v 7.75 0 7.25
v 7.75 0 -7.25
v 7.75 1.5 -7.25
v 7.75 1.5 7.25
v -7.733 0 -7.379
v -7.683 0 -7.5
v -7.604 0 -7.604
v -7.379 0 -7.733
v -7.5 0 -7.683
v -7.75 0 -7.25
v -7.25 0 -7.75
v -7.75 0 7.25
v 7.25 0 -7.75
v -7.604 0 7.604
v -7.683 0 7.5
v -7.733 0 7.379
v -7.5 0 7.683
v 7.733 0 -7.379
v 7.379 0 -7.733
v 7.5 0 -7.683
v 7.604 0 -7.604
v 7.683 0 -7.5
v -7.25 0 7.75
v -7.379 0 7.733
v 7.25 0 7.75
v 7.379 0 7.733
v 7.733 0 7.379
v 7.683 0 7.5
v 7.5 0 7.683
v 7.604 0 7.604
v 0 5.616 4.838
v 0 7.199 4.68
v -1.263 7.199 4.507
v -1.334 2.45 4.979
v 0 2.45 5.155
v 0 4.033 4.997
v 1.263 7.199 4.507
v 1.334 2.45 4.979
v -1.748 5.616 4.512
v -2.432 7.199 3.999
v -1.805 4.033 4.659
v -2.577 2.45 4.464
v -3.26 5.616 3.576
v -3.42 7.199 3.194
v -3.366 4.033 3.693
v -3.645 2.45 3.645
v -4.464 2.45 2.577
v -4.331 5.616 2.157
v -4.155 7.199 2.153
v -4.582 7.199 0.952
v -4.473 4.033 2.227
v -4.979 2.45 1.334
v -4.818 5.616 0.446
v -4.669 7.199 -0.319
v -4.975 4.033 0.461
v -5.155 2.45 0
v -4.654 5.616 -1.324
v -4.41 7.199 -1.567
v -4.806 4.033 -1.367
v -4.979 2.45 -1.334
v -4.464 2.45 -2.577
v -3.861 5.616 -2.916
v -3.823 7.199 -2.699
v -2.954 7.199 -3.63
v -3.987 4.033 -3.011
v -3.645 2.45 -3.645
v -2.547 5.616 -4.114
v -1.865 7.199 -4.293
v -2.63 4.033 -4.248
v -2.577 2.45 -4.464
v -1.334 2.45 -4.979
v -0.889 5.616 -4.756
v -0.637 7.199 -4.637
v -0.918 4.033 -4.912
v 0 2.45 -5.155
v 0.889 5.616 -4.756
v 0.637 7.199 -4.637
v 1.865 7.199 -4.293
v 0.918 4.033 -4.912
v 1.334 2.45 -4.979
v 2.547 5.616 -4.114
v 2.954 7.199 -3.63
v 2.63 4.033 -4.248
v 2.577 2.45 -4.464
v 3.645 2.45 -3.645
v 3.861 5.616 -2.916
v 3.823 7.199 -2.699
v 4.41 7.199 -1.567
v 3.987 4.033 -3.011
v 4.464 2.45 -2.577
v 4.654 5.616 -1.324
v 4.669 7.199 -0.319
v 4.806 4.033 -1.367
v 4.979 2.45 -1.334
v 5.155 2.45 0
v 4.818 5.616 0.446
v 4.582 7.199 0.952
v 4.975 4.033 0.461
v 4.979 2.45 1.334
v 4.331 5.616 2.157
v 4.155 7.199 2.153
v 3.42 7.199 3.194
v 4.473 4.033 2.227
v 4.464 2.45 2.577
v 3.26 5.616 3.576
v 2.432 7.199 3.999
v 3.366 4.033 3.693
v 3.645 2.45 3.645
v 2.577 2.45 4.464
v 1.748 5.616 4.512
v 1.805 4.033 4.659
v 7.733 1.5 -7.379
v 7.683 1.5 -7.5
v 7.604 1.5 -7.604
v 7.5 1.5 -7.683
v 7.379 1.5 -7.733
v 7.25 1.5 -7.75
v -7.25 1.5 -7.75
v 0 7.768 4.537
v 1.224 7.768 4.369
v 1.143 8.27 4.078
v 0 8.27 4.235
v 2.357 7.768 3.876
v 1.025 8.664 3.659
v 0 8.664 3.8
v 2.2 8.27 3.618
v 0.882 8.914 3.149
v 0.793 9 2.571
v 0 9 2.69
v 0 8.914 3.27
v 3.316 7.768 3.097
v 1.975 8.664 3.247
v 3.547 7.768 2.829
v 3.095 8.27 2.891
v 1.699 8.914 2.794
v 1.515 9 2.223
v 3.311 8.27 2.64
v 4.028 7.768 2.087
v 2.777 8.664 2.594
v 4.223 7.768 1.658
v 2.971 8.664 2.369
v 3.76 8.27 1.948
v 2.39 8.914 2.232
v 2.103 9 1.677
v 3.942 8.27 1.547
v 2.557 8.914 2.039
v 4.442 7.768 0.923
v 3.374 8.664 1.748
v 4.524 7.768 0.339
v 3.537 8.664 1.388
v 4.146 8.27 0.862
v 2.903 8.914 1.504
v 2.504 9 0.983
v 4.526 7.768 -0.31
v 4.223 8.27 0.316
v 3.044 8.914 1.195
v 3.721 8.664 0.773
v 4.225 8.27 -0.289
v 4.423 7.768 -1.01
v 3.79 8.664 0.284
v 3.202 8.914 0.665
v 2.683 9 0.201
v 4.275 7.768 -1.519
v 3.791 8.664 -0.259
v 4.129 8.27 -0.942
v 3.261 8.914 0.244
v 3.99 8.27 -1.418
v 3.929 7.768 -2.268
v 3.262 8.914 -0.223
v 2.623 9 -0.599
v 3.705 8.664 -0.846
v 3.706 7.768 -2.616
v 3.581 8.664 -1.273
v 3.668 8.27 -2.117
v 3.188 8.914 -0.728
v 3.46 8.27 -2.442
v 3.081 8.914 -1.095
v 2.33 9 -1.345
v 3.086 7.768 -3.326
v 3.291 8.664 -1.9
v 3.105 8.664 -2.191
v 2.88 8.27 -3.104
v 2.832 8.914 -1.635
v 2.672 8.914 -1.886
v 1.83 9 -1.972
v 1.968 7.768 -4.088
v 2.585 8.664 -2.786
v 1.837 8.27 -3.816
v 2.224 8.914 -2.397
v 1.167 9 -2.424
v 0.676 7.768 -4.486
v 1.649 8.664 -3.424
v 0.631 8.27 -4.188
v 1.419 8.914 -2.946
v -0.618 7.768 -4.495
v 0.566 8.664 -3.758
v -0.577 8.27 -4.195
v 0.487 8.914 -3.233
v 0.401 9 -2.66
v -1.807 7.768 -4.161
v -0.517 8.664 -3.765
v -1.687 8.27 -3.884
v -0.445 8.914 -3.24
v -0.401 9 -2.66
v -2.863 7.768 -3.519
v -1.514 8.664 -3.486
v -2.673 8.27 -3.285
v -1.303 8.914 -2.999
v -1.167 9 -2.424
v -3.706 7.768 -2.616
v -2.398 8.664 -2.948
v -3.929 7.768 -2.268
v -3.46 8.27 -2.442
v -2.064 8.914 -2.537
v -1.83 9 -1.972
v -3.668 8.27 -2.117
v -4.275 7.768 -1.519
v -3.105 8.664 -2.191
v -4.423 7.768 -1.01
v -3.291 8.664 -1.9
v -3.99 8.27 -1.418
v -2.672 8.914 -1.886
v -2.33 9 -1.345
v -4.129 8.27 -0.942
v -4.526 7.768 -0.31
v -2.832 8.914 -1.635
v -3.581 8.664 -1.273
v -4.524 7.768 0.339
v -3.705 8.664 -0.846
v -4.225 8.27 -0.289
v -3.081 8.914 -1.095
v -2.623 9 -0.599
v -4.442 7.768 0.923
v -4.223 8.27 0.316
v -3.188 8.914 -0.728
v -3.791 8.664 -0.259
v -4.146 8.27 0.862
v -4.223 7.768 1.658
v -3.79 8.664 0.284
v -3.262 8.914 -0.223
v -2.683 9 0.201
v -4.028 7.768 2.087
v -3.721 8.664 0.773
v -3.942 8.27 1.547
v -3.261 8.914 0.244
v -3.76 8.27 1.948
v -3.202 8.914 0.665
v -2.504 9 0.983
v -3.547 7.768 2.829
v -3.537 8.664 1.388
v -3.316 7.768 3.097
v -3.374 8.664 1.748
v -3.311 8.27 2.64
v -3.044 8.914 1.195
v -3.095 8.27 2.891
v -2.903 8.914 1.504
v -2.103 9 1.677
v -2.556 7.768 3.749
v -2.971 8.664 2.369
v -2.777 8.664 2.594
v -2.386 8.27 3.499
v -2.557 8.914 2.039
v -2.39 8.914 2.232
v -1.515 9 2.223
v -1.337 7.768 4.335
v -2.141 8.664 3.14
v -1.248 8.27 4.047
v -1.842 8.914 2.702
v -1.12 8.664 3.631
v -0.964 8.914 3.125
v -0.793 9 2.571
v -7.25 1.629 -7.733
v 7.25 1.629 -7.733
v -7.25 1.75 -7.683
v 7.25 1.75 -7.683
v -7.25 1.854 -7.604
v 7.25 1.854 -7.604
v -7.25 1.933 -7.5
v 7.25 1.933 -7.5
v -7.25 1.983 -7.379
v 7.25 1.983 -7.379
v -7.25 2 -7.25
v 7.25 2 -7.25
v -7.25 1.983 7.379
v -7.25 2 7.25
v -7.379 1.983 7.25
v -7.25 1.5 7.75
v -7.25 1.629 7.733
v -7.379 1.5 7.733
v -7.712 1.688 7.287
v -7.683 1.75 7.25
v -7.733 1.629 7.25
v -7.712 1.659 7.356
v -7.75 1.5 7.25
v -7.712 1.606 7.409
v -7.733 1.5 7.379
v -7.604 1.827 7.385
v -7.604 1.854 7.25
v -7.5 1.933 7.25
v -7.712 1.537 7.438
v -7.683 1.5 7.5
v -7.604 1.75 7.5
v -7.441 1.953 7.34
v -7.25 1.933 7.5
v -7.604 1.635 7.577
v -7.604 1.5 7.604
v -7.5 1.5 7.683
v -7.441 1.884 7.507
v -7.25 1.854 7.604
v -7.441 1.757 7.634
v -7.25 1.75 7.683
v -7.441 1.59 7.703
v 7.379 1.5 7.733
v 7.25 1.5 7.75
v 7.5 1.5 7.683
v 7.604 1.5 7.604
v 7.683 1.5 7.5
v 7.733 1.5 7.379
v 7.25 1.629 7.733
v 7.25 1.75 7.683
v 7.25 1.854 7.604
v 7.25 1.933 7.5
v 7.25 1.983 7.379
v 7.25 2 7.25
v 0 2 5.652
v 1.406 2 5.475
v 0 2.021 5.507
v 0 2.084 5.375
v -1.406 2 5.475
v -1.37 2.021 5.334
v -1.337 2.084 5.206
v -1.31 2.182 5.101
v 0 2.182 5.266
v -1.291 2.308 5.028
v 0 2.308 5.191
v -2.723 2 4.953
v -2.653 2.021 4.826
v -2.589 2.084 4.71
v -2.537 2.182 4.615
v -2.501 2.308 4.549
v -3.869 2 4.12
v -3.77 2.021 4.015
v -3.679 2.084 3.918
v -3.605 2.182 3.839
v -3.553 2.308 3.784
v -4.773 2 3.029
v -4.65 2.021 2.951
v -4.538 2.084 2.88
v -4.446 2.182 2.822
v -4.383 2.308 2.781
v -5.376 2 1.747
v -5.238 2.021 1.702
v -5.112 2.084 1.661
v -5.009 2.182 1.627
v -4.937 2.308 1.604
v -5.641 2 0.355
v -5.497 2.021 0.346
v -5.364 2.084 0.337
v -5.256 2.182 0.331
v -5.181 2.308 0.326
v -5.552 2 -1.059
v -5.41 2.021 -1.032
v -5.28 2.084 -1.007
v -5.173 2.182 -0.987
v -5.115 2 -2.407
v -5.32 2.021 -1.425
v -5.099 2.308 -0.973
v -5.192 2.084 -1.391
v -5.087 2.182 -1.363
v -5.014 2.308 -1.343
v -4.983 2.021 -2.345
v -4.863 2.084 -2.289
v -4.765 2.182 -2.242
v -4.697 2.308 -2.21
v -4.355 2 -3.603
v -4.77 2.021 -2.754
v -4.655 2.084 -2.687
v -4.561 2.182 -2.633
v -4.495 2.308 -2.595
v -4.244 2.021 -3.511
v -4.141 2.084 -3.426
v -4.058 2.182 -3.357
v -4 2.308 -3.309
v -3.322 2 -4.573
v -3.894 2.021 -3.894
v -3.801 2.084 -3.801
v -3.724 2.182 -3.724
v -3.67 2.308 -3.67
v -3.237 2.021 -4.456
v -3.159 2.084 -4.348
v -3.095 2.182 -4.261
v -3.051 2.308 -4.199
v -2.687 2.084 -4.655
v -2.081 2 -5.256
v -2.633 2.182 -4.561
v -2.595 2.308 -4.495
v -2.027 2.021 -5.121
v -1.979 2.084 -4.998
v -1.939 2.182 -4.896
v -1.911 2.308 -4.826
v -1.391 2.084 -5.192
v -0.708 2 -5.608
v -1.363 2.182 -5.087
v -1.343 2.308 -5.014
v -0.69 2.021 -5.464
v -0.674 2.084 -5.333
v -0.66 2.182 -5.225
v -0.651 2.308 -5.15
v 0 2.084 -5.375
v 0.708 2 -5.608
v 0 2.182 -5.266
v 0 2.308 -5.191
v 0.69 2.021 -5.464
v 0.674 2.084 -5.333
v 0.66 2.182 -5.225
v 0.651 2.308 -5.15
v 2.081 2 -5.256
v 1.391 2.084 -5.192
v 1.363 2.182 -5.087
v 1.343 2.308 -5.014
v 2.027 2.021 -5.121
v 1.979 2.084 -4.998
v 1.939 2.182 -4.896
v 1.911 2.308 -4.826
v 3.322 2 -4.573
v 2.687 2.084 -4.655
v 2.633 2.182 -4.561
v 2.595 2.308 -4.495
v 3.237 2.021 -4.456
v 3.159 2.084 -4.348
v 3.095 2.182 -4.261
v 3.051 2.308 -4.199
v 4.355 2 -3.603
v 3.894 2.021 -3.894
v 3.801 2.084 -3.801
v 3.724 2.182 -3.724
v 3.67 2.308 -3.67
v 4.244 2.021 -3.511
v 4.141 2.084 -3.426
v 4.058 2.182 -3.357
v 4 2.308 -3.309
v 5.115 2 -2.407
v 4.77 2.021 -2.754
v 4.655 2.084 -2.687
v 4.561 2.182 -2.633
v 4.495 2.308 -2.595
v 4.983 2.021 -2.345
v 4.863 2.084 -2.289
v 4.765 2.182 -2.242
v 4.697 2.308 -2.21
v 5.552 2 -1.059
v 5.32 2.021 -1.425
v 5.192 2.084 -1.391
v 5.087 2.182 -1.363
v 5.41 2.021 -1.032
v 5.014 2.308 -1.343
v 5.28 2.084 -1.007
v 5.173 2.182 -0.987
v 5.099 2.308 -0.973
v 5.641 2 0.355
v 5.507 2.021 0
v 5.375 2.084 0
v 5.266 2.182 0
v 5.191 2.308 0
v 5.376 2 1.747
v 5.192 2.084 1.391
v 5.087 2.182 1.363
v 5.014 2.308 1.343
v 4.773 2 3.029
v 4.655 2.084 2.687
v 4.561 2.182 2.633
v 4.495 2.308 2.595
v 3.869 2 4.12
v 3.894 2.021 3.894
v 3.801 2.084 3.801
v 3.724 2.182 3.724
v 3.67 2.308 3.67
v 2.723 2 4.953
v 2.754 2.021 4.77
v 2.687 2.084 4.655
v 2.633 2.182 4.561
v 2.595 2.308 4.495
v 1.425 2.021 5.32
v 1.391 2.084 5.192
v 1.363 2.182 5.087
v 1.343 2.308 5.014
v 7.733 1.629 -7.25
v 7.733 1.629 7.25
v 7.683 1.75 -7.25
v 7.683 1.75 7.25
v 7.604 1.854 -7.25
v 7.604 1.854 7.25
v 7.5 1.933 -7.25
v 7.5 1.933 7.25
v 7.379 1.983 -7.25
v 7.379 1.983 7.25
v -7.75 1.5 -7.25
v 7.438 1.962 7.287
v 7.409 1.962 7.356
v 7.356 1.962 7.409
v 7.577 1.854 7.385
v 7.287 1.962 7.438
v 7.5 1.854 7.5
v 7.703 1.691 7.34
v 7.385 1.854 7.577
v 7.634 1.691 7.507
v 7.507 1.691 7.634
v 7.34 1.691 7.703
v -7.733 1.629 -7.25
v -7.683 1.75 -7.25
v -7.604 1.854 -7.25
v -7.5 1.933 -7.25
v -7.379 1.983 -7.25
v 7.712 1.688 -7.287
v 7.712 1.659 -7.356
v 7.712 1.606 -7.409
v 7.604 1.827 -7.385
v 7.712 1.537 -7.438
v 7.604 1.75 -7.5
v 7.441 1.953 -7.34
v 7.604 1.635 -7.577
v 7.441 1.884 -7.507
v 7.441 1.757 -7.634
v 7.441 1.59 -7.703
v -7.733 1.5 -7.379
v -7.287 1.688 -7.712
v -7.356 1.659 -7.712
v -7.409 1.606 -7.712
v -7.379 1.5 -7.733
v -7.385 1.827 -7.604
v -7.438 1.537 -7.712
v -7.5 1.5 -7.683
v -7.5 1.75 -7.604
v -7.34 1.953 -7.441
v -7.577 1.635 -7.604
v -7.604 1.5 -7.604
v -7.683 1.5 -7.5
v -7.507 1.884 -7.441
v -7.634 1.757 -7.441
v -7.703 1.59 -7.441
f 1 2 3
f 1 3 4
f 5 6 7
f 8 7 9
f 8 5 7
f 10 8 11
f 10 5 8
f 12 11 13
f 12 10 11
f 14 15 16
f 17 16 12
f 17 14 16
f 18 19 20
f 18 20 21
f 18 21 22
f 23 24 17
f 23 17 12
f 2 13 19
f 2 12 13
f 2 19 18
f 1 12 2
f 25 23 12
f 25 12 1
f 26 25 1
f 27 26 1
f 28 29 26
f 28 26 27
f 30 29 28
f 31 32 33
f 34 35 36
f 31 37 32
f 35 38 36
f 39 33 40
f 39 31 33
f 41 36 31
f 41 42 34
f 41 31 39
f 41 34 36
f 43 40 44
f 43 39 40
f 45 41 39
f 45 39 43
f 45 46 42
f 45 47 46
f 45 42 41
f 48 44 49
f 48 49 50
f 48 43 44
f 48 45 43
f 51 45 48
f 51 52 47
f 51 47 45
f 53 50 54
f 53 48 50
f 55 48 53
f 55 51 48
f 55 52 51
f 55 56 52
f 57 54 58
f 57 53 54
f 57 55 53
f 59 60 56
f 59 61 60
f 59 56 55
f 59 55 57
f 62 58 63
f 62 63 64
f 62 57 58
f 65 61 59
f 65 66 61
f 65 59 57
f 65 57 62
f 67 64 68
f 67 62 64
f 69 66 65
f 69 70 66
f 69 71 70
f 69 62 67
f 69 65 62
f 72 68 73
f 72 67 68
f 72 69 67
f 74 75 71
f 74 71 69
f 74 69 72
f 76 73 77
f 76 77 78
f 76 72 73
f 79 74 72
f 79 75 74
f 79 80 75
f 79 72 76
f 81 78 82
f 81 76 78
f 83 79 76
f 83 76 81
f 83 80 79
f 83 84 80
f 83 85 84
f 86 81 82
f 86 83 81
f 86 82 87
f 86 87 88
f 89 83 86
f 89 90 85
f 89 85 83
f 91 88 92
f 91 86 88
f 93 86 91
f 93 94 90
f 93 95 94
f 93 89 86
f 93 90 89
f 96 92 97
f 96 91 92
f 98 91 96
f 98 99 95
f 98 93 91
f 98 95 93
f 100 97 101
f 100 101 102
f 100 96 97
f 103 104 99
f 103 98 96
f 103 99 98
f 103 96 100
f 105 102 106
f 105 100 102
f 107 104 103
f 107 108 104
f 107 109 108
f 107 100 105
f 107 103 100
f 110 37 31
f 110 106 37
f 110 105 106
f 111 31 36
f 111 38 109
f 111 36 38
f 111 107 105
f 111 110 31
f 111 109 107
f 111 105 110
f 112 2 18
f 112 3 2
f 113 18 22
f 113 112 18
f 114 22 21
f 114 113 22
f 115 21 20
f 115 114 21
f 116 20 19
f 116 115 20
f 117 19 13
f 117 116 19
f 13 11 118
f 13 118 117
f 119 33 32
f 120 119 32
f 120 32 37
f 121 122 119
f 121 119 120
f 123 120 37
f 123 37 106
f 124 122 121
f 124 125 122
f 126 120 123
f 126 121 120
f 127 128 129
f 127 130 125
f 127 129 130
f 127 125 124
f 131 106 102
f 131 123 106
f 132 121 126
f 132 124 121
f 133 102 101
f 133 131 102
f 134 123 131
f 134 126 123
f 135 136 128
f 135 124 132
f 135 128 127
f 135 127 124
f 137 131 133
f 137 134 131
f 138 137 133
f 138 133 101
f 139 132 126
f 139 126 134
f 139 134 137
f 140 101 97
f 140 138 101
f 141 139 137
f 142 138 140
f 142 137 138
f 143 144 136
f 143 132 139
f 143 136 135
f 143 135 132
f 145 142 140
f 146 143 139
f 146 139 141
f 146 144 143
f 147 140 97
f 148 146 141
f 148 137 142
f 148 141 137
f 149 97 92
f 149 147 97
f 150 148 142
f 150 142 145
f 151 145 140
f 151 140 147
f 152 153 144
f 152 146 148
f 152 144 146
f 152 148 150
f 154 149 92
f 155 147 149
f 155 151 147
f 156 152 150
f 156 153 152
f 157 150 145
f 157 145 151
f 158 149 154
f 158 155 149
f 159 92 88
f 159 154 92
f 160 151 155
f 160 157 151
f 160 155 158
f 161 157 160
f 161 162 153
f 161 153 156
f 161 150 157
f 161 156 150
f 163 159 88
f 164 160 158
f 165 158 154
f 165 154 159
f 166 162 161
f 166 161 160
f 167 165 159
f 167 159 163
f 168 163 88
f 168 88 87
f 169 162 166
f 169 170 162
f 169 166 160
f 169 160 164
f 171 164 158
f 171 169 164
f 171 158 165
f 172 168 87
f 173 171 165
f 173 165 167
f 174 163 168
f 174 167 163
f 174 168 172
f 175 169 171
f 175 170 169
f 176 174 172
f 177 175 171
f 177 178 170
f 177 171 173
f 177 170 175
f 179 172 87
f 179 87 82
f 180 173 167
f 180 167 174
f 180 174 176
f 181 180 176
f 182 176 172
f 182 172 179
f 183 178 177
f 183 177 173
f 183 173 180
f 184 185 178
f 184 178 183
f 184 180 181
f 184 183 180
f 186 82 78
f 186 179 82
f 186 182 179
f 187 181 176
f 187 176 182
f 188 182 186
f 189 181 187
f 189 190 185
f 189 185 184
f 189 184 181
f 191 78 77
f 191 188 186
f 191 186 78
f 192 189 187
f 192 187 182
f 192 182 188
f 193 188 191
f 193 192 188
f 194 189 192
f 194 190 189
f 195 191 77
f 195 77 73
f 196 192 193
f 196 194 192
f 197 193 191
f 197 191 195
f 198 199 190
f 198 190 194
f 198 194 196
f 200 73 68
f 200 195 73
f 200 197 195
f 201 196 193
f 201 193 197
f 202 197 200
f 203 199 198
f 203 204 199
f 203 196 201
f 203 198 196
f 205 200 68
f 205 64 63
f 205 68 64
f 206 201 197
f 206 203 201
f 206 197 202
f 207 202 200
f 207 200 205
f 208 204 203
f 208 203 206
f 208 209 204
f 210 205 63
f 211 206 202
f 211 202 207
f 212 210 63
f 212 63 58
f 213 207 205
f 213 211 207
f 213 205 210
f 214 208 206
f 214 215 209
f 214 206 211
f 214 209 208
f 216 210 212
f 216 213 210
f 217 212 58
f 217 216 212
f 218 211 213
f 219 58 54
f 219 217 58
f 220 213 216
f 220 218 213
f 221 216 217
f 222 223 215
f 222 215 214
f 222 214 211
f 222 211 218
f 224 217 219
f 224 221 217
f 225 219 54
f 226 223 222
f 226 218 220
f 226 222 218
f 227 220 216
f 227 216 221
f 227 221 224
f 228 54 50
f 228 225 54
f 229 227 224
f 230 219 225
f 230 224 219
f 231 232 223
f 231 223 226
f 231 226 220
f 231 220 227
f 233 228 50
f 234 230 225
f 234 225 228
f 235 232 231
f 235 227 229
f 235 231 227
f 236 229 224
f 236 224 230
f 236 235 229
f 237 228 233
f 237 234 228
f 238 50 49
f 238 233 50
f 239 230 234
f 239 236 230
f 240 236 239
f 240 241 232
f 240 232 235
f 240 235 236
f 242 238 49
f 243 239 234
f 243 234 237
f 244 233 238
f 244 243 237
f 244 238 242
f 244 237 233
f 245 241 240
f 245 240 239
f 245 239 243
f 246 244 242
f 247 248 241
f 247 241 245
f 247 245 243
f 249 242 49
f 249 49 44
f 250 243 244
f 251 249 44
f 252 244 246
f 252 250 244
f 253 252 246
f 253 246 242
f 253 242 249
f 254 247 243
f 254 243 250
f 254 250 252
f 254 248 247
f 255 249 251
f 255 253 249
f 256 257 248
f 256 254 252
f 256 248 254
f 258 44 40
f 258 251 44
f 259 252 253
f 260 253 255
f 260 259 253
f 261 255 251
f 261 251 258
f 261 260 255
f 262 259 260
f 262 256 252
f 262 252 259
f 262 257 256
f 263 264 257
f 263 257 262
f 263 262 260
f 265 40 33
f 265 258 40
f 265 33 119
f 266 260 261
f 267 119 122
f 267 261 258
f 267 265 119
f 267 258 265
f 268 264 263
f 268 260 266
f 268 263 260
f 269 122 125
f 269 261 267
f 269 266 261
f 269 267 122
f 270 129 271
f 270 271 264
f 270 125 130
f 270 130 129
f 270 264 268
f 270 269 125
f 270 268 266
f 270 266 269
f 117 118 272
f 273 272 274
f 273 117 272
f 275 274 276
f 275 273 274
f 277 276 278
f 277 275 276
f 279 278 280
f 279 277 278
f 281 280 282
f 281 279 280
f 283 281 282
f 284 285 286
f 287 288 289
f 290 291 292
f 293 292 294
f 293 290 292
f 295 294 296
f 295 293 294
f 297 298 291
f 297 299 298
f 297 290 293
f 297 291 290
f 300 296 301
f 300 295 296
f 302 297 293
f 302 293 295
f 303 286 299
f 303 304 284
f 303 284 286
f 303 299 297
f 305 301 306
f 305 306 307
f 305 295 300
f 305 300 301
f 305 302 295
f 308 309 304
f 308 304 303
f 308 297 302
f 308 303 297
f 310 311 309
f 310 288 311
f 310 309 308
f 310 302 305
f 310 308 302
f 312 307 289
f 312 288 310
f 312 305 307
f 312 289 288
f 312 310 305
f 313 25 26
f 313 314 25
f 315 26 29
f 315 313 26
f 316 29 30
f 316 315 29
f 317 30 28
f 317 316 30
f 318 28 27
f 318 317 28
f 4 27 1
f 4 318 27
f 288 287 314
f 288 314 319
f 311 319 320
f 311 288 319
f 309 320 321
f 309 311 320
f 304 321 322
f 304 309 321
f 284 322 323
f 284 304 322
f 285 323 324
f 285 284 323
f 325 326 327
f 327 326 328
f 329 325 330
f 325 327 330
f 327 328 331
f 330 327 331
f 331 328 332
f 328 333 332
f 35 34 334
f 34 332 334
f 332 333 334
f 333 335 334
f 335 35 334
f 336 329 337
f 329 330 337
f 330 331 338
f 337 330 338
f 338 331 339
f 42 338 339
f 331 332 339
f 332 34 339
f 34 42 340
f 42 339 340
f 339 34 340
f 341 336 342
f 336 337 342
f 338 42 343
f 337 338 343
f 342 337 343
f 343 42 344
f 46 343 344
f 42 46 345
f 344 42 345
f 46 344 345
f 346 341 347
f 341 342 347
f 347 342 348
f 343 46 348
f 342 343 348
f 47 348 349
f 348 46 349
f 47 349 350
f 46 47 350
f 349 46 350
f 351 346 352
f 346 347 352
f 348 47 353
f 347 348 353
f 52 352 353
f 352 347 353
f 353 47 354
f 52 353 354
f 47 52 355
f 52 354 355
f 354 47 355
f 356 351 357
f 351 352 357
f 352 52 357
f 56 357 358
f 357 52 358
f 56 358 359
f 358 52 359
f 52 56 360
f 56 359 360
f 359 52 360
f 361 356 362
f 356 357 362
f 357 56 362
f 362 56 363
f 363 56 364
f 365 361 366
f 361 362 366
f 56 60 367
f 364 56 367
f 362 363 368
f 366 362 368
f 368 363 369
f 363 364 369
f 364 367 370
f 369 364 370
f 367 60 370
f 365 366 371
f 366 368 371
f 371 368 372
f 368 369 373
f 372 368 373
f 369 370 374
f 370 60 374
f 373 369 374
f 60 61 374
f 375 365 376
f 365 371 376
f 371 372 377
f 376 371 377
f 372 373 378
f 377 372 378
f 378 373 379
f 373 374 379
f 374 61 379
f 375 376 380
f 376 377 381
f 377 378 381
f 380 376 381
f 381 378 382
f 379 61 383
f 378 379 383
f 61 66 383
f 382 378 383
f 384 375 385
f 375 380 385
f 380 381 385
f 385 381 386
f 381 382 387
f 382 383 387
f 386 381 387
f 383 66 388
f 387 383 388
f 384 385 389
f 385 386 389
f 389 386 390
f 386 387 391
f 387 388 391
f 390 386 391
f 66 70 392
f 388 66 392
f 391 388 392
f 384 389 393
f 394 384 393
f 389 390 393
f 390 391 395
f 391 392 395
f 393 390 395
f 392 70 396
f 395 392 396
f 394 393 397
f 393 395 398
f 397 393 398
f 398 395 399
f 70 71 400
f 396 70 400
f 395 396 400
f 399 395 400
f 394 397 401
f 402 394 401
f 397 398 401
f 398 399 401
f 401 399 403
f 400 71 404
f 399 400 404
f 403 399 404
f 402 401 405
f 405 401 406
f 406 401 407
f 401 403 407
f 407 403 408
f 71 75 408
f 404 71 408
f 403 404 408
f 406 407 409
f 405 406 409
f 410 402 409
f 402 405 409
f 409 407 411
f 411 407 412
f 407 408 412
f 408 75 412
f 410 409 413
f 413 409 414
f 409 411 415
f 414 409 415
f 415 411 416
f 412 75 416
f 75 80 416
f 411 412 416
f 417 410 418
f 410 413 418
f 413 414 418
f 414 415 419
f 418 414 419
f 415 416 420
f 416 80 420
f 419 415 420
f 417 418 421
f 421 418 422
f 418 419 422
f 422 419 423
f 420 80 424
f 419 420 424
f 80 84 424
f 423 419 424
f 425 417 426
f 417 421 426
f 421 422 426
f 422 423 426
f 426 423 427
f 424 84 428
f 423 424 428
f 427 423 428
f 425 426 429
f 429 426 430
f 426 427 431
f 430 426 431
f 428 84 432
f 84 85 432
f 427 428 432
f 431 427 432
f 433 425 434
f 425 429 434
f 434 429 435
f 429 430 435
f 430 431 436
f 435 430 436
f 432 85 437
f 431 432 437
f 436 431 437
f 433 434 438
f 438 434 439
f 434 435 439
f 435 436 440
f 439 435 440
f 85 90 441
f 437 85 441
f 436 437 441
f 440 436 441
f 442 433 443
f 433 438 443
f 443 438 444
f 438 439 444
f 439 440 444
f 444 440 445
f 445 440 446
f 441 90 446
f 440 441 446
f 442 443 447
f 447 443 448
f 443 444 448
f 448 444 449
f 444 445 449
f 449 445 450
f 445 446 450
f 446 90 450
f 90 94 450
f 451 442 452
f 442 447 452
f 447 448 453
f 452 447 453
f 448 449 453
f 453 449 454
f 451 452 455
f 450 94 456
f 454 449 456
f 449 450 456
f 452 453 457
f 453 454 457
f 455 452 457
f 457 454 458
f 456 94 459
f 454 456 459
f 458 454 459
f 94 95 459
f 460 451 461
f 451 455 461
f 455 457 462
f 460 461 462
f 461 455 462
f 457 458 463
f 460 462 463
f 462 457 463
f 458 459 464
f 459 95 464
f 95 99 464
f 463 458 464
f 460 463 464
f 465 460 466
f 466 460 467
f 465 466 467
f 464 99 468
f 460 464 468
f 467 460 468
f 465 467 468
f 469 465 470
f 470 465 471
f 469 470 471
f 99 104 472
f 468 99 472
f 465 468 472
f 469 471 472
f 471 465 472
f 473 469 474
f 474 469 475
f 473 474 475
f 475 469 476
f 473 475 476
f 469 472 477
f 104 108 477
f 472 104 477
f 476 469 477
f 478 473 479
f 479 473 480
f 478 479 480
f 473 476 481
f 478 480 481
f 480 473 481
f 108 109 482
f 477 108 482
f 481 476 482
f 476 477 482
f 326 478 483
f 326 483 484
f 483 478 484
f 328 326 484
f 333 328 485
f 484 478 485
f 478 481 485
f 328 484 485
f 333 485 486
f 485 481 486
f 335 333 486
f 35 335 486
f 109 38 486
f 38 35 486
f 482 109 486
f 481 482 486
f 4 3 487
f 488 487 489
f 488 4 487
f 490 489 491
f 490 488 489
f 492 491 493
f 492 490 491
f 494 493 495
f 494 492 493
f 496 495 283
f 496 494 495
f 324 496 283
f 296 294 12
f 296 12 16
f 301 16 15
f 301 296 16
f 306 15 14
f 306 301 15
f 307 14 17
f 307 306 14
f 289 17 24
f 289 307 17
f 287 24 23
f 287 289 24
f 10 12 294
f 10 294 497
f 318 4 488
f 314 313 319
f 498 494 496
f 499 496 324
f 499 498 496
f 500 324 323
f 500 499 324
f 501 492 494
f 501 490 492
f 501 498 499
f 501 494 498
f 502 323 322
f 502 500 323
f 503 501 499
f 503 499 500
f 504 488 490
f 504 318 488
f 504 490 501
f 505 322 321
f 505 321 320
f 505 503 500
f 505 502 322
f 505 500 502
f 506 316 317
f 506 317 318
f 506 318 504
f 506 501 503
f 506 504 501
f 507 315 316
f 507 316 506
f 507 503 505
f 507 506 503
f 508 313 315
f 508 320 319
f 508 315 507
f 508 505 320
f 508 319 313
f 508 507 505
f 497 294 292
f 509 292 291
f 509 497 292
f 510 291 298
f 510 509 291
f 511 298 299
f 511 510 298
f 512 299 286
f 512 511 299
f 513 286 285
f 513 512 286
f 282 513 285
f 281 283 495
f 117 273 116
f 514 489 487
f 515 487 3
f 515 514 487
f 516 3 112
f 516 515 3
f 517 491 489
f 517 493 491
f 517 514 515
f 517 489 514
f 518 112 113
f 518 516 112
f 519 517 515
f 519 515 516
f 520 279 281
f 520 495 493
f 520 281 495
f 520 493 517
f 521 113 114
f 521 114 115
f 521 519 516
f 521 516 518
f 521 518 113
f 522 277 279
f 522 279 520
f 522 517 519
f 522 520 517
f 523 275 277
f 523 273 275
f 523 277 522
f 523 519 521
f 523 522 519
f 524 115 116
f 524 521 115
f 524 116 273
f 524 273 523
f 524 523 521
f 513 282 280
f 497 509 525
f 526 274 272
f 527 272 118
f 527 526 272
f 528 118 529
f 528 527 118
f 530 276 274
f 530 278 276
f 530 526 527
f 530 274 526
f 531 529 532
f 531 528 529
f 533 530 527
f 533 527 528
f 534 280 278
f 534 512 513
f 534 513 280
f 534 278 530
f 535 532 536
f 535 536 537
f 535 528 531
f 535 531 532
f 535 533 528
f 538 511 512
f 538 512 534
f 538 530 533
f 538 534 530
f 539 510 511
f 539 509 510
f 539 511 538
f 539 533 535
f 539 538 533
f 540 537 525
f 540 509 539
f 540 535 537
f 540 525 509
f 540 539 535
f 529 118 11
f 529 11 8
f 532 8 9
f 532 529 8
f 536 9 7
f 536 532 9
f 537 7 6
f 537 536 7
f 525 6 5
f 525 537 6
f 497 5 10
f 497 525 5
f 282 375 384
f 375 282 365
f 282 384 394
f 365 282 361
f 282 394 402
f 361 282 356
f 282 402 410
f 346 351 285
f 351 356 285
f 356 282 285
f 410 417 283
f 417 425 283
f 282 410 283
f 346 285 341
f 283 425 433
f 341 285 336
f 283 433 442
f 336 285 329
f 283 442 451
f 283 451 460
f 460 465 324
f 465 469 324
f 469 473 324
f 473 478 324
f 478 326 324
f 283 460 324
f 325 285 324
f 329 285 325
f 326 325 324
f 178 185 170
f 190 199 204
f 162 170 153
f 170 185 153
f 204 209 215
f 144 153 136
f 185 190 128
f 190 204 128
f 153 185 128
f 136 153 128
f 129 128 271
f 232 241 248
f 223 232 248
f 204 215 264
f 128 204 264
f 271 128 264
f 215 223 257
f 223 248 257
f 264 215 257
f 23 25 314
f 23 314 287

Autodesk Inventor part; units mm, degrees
ref_plane "YZ Plane" through (0, 0, 0) normal (1, 0, 0) x (0, 1, 0)
ref_plane "XZ Plane" through (0, 0, 0) normal (0, 1, 0) x (-1, 0, 0)
ref_plane "XY Plane" through (0, 0, 0) normal (0, 0, 1) x (1, 0, 0)
sketch "Sketch1" plane through (0, 0, 0) normal (1, 0, 0) x (0, 1, 0)
  line L0 (9, 0) -> (9, 4.5)
  line L1 (9, 4.5) -> (2, 5.2)
  line L2 (2, 5.2) -> (2, 7.2)
  line L3 (2, 7.2) -> (0, 7.2)
  line L4 (0, 7.2) -> (0, 0)
  line L5 (9, 0) -> (0, 0)
  dimension "d0" = 4.5
  dimension "d1" = 9
  dimension "d2" = 2
  dimension "d3" = 2
  dimension "d5" = 7.2
  dimension "d6" = 5.2
revolve "Revolution1" add sketch "Sketch1" angle 360 about axis through (0, 9, 0) along (0, -1, 0)
fillet "Fillet1" radius 2 1 edges at (0, 9, -4.5)
sketch "Sketch2" plane through (0, 0, 0) normal (0, -1, 0) x (1, 0, 0)
  line L0 (-7.75, -7.75) -> (7.75, -7.75)
  line L1 (7.75, -7.75) -> (7.75, 7.75)
  line L2 (7.75, 7.75) -> (-7.75, 7.75)
  line L3 (-7.75, 7.75) -> (-7.75, -7.75)
  line L4 (-7.75, -7.75) -> (7.75, 7.75) construction
  line L5 (7.75, -7.75) -> (-7.75, 7.75) construction
  point P0 (0, 0)
  dimension "d10" = 15.5
  dimension "d11" = 15.5
extrude "Extrusion1" add sketch "Sketch2" against normal up to surface (2 mm away)
fillet "Fillet4" radius 0.5 9 edges at (7.75, 1, 7.75) (0, 2, 7.75) (-7.75, 2, 0) (0, 2, -7.75) (7.75, 2, 0) (0, 2, -5.2) (7.75, 1, -7.75) (-7.75, 1, -7.75) (-7.75, 1, 7.75)
ref_plane "Work Plane1" through (0, 0, -7.25) normal (-1, 0, 0) x (0, 0, 1)
